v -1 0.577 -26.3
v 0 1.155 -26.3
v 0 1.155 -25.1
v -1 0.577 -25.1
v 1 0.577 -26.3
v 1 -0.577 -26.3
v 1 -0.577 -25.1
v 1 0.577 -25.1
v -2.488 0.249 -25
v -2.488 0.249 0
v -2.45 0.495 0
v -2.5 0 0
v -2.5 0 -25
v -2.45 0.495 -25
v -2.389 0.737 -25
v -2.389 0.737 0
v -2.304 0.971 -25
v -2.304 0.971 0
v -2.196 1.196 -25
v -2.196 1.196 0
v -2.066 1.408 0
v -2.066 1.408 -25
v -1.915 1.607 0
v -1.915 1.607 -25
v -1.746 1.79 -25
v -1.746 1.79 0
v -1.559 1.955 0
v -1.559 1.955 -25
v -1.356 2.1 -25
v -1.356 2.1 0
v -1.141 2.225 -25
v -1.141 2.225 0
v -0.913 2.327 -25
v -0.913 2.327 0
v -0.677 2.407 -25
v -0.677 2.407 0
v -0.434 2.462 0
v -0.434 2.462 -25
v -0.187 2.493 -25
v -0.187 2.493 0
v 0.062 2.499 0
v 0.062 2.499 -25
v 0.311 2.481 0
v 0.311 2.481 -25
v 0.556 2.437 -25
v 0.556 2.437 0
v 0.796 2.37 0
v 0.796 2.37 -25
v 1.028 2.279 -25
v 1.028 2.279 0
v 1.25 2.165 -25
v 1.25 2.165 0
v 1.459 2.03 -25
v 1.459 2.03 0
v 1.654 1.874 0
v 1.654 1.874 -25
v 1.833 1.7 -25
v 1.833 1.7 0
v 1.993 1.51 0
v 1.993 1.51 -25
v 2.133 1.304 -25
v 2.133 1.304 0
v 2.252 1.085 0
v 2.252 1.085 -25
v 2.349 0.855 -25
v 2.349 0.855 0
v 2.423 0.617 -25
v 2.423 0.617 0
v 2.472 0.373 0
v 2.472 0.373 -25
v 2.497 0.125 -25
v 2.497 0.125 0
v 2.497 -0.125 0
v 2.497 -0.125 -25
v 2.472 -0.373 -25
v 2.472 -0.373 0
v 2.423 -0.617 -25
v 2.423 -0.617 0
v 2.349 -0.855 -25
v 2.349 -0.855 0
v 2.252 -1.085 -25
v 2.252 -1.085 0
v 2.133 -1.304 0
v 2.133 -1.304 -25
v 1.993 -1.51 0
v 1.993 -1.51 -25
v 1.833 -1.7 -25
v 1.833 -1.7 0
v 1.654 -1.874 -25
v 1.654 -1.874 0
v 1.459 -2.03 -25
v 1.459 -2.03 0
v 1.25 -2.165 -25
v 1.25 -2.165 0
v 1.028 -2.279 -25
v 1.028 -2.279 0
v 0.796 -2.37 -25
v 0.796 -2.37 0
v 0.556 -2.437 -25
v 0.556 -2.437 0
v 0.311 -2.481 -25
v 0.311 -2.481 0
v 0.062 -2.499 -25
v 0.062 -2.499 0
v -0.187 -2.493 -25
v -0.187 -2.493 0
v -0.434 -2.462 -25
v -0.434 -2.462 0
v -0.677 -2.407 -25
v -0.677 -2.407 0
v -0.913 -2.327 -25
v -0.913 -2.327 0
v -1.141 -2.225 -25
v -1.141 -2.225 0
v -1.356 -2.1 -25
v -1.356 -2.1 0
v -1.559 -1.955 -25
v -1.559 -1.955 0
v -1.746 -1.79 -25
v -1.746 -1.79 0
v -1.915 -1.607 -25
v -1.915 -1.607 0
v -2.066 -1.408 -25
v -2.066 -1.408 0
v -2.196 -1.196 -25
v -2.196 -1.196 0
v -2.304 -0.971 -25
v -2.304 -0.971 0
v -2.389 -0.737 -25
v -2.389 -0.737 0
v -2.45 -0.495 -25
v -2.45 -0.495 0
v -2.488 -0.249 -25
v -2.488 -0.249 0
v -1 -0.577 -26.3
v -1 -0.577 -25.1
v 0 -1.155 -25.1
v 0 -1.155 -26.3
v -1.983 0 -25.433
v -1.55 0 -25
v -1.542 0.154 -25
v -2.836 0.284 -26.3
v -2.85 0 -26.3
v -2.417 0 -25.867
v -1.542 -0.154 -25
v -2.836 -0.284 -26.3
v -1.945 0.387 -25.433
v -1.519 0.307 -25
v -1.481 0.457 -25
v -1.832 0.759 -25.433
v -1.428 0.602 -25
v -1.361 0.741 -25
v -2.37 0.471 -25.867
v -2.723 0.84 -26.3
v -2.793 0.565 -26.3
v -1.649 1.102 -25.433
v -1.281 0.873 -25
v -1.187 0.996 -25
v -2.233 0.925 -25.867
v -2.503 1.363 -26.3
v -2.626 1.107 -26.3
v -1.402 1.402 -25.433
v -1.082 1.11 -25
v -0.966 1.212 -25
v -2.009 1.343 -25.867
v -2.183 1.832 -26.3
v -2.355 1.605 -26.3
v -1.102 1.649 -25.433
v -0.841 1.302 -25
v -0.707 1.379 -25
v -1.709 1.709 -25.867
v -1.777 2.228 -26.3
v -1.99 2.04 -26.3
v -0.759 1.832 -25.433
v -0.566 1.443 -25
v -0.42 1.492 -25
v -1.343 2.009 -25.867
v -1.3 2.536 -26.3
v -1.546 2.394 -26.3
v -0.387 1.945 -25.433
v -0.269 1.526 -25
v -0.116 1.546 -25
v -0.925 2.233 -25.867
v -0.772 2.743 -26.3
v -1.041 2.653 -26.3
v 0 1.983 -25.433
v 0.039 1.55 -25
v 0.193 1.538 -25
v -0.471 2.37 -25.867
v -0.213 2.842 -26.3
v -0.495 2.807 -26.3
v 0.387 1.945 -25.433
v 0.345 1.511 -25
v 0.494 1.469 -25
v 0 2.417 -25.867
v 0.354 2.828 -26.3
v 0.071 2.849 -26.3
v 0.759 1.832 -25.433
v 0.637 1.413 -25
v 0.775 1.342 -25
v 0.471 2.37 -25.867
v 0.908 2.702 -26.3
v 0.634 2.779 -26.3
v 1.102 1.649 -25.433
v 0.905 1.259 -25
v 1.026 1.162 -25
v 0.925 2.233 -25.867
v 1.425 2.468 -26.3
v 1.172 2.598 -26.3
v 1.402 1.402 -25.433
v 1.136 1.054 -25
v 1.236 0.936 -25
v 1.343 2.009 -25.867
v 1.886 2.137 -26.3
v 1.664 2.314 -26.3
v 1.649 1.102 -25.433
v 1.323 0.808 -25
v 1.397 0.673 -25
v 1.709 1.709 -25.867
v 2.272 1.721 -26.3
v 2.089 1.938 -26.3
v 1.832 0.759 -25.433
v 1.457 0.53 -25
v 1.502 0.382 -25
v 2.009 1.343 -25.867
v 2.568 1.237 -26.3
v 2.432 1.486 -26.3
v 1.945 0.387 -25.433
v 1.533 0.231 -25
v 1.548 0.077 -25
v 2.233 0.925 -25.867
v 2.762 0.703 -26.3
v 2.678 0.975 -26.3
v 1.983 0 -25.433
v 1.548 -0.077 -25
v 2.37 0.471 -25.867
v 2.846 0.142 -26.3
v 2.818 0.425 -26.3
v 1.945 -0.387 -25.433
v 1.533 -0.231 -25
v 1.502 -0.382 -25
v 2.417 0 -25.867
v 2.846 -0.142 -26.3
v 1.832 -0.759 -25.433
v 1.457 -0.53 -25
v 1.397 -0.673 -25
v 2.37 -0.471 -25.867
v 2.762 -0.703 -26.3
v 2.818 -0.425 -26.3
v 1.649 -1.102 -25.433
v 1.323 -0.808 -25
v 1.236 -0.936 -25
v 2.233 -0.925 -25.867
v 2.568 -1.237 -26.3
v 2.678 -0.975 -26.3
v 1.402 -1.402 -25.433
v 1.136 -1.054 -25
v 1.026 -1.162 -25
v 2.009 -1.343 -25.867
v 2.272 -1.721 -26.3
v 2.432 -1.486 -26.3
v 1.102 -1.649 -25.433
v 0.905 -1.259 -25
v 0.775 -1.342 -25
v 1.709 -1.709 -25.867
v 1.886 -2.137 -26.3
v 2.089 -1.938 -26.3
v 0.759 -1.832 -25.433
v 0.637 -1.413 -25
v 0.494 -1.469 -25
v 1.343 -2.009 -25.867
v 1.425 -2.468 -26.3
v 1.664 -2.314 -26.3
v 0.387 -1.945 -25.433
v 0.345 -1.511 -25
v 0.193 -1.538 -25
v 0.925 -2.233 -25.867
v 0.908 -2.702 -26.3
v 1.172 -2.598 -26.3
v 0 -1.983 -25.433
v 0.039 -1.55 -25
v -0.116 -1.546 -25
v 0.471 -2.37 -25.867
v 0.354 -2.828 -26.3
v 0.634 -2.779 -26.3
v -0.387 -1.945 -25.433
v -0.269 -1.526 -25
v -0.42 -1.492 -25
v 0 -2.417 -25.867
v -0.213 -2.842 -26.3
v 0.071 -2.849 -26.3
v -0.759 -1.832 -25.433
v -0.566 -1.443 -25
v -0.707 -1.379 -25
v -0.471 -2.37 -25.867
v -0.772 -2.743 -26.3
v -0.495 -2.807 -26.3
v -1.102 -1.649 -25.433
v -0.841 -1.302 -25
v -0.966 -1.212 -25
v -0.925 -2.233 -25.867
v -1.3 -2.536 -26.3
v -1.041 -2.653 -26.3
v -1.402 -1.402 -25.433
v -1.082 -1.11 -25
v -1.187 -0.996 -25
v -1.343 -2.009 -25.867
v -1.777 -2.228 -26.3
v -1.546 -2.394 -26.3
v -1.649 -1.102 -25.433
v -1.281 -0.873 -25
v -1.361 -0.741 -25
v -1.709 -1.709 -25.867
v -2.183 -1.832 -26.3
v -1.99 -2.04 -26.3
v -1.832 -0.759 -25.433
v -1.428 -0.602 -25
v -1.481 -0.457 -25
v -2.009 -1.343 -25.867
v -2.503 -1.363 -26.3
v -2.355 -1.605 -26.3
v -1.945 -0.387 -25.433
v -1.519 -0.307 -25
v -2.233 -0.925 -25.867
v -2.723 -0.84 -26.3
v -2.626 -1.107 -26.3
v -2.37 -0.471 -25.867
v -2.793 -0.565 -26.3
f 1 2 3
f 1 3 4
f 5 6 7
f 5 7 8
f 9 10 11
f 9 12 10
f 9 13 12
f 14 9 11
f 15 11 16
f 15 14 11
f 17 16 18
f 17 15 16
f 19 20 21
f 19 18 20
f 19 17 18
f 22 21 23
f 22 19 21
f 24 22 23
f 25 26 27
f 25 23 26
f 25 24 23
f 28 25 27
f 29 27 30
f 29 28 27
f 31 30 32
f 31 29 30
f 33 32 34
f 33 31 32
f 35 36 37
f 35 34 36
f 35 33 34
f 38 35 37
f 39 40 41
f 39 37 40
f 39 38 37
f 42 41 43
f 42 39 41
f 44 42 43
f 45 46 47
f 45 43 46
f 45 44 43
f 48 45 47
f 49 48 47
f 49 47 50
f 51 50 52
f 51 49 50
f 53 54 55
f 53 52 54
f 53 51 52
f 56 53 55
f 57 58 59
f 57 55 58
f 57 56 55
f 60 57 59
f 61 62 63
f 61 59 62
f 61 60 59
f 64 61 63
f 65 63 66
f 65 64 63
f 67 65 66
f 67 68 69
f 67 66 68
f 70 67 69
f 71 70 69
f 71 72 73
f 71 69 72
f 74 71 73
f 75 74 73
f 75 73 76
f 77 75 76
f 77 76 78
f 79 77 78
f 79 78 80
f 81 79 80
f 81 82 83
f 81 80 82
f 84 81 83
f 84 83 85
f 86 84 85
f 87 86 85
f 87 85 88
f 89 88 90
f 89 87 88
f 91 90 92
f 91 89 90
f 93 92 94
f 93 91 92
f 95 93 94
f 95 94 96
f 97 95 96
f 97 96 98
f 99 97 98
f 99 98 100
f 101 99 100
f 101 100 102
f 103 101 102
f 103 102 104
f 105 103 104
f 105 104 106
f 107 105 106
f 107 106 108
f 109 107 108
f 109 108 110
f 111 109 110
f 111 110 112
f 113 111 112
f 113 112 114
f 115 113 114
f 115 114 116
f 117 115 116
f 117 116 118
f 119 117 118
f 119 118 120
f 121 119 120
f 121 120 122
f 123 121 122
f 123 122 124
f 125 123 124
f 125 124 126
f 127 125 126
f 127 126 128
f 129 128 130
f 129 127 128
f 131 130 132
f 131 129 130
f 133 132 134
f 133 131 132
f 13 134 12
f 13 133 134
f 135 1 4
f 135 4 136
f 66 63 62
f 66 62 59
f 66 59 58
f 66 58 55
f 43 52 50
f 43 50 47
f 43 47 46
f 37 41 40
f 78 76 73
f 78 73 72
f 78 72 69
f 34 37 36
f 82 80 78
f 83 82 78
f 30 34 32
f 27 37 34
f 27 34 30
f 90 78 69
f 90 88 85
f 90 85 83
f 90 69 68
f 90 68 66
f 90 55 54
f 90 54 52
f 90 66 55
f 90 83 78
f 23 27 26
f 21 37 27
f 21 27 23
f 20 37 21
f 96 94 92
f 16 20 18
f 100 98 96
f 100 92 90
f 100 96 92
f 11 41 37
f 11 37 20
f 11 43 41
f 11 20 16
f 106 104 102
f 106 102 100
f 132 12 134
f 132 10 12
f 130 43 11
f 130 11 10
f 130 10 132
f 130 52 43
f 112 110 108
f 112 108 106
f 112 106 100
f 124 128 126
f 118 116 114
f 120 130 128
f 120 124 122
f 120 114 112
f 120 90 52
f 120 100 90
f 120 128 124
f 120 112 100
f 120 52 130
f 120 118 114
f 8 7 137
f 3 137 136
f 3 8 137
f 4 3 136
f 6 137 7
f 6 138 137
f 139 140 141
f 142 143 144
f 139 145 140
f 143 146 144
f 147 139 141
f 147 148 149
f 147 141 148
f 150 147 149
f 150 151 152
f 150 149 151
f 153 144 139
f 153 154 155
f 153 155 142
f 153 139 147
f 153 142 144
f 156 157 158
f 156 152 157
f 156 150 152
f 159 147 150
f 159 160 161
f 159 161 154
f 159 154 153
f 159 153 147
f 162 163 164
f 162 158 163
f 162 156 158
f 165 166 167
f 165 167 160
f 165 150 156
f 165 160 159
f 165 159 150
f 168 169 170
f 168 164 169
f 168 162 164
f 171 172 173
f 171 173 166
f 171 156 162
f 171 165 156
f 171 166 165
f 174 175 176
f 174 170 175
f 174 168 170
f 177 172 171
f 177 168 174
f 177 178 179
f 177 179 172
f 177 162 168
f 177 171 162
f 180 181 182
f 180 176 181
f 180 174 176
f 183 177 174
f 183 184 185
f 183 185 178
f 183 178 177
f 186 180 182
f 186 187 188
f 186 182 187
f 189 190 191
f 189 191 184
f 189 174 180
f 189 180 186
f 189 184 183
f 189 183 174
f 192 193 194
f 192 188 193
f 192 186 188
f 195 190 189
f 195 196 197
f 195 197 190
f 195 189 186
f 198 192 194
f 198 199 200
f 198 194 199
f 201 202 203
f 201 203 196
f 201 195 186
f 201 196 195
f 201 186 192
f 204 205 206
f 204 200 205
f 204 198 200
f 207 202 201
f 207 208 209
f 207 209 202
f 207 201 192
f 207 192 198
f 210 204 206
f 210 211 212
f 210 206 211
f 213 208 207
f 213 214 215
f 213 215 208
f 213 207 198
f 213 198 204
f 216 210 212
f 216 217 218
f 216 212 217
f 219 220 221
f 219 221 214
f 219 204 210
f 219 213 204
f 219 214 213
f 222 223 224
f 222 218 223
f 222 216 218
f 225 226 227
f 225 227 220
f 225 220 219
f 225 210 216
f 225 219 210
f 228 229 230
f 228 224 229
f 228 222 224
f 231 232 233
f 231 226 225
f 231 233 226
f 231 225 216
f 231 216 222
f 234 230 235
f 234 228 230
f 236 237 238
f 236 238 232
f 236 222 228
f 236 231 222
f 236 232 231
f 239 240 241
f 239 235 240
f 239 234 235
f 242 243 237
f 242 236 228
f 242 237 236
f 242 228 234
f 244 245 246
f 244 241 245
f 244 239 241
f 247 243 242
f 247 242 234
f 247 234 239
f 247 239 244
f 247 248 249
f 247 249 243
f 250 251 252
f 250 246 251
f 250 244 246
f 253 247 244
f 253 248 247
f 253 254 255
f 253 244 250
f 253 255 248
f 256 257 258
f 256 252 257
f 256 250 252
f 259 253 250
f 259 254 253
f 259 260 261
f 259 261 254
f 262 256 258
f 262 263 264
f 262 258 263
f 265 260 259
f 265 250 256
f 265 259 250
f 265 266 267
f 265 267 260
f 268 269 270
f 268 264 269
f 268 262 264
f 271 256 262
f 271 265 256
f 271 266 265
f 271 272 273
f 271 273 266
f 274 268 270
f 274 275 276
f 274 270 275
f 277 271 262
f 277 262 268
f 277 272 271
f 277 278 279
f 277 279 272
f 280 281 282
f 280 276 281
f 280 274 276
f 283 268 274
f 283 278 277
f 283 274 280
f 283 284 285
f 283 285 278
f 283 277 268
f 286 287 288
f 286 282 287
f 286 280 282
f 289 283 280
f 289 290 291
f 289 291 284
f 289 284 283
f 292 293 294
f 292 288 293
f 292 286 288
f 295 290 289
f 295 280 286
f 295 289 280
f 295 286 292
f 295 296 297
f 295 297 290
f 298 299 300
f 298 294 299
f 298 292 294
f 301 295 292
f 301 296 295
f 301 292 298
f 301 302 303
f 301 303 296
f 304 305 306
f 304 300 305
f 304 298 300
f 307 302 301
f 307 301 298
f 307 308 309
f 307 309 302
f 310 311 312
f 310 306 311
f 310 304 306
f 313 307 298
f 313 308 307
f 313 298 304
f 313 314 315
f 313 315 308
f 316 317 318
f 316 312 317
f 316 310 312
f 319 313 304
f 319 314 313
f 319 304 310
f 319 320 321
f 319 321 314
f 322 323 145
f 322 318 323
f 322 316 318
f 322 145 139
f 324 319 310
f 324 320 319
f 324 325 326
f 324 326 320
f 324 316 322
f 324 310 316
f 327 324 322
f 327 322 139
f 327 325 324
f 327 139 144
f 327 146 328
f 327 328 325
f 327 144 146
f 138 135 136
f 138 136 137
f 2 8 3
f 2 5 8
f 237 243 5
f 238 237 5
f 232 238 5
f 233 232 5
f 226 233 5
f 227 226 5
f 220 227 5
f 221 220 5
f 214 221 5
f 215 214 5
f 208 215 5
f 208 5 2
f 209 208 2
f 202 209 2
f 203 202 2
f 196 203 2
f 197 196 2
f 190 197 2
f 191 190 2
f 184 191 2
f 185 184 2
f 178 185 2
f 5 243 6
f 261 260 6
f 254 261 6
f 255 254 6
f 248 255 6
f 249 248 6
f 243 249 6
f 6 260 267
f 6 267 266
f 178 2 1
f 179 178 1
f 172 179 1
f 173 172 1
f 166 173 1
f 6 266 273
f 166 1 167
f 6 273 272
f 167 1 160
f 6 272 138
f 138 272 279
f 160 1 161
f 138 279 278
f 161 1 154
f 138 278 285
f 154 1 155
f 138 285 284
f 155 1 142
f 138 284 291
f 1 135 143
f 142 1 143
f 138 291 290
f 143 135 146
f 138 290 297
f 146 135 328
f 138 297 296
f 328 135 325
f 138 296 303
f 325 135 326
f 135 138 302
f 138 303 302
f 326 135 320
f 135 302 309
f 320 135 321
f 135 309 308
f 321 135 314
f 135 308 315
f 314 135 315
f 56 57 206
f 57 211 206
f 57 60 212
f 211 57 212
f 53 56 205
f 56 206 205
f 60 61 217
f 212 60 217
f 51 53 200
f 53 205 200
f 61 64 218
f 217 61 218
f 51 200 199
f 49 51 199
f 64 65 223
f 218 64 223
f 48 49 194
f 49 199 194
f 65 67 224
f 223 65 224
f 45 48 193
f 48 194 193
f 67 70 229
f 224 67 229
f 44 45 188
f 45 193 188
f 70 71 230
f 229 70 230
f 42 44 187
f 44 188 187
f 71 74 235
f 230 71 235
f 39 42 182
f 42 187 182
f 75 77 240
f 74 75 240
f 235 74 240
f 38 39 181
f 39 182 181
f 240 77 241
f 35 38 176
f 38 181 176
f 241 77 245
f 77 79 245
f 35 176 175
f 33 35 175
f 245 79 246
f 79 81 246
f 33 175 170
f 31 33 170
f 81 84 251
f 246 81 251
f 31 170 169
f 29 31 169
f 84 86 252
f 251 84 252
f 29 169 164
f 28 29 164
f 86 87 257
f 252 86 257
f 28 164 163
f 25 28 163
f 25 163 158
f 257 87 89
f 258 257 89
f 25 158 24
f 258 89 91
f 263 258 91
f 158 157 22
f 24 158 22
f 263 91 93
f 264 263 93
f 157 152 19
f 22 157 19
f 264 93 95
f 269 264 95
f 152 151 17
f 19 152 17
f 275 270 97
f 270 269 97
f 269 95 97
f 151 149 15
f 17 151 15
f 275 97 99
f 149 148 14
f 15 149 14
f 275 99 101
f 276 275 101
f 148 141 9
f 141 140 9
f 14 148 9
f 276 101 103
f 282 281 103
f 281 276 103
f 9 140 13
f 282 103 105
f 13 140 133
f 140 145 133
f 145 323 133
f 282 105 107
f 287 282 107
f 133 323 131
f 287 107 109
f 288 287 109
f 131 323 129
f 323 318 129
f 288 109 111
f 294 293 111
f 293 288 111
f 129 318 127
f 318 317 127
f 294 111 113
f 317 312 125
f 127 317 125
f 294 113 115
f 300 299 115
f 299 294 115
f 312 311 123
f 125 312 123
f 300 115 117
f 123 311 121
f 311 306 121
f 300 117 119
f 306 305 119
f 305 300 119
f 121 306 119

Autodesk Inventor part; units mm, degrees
ref_plane "YZ Plane" through (0, 0, 0) normal (1, 0, 0) x (0, 1, 0)
ref_plane "XZ Plane" through (0, 0, 0) normal (0, 1, 0) x (-1, 0, 0)
ref_plane "XY Plane" through (0, 0, 0) normal (0, 0, 1) x (1, 0, 0)
sketch "Sketch1" plane through (0, 0, 0) normal (0, 1, 0) x (-1, 0, 0)
  line L0 (0, 0) -> (2.5, 0)
  line L1 (2.5, 0) -> (2.5, -25)
  line L2 (2.5, -25) -> (0, -25)
  line L3 (0, -25) -> (0, 0)
  line L4 (0, -25) -> (2.775, -25)
  line L5 (0, -26.3) -> (2.85, -26.3)
  line L6 (2.85, -26.3) -> (1.55, -25)
  line L7 (2.85, -26.3) -> (4.6885, -26.3) construction
  line L8 (0, -26.3) -> (0, -25)
  dimension "d1" = 25
  dimension "d2" = 2.775
  dimension "d20" = 2.85
  dimension "d21" = 1.3
  dimension "d22" = 135
revolve "Revolution1" add sketch "Sketch1" angle 360 about axis through (0, 0, -25) along (0, 0, 1)
sketch "Sketch4" plane through (0, 0, -26.3) normal (0, 0, -1) x (-1, 0, 0)
  circle A0 centre (0, 0) radius 1.55 projected
  line L0 (0, 1.1547) -> (1, 0.5774)
  line L1 (1, 0.5774) -> (1, -0.5774)
  line L2 (1, -0.5774) -> (0, -1.1547)
  line L3 (0, -1.1547) -> (-1, -0.5774)
  line L4 (-1, -0.5774) -> (-1, 0.5774)
  line L5 (-1, 0.5774) -> (0, 1.1547)
  dimension "d23" = 2
extrude "Extrusion2" cut sketch "Sketch4" against normal blind 1.2 contours L0 L1 L2 L3 L4 L5
properties part number "m3 spacer bolt combo"
